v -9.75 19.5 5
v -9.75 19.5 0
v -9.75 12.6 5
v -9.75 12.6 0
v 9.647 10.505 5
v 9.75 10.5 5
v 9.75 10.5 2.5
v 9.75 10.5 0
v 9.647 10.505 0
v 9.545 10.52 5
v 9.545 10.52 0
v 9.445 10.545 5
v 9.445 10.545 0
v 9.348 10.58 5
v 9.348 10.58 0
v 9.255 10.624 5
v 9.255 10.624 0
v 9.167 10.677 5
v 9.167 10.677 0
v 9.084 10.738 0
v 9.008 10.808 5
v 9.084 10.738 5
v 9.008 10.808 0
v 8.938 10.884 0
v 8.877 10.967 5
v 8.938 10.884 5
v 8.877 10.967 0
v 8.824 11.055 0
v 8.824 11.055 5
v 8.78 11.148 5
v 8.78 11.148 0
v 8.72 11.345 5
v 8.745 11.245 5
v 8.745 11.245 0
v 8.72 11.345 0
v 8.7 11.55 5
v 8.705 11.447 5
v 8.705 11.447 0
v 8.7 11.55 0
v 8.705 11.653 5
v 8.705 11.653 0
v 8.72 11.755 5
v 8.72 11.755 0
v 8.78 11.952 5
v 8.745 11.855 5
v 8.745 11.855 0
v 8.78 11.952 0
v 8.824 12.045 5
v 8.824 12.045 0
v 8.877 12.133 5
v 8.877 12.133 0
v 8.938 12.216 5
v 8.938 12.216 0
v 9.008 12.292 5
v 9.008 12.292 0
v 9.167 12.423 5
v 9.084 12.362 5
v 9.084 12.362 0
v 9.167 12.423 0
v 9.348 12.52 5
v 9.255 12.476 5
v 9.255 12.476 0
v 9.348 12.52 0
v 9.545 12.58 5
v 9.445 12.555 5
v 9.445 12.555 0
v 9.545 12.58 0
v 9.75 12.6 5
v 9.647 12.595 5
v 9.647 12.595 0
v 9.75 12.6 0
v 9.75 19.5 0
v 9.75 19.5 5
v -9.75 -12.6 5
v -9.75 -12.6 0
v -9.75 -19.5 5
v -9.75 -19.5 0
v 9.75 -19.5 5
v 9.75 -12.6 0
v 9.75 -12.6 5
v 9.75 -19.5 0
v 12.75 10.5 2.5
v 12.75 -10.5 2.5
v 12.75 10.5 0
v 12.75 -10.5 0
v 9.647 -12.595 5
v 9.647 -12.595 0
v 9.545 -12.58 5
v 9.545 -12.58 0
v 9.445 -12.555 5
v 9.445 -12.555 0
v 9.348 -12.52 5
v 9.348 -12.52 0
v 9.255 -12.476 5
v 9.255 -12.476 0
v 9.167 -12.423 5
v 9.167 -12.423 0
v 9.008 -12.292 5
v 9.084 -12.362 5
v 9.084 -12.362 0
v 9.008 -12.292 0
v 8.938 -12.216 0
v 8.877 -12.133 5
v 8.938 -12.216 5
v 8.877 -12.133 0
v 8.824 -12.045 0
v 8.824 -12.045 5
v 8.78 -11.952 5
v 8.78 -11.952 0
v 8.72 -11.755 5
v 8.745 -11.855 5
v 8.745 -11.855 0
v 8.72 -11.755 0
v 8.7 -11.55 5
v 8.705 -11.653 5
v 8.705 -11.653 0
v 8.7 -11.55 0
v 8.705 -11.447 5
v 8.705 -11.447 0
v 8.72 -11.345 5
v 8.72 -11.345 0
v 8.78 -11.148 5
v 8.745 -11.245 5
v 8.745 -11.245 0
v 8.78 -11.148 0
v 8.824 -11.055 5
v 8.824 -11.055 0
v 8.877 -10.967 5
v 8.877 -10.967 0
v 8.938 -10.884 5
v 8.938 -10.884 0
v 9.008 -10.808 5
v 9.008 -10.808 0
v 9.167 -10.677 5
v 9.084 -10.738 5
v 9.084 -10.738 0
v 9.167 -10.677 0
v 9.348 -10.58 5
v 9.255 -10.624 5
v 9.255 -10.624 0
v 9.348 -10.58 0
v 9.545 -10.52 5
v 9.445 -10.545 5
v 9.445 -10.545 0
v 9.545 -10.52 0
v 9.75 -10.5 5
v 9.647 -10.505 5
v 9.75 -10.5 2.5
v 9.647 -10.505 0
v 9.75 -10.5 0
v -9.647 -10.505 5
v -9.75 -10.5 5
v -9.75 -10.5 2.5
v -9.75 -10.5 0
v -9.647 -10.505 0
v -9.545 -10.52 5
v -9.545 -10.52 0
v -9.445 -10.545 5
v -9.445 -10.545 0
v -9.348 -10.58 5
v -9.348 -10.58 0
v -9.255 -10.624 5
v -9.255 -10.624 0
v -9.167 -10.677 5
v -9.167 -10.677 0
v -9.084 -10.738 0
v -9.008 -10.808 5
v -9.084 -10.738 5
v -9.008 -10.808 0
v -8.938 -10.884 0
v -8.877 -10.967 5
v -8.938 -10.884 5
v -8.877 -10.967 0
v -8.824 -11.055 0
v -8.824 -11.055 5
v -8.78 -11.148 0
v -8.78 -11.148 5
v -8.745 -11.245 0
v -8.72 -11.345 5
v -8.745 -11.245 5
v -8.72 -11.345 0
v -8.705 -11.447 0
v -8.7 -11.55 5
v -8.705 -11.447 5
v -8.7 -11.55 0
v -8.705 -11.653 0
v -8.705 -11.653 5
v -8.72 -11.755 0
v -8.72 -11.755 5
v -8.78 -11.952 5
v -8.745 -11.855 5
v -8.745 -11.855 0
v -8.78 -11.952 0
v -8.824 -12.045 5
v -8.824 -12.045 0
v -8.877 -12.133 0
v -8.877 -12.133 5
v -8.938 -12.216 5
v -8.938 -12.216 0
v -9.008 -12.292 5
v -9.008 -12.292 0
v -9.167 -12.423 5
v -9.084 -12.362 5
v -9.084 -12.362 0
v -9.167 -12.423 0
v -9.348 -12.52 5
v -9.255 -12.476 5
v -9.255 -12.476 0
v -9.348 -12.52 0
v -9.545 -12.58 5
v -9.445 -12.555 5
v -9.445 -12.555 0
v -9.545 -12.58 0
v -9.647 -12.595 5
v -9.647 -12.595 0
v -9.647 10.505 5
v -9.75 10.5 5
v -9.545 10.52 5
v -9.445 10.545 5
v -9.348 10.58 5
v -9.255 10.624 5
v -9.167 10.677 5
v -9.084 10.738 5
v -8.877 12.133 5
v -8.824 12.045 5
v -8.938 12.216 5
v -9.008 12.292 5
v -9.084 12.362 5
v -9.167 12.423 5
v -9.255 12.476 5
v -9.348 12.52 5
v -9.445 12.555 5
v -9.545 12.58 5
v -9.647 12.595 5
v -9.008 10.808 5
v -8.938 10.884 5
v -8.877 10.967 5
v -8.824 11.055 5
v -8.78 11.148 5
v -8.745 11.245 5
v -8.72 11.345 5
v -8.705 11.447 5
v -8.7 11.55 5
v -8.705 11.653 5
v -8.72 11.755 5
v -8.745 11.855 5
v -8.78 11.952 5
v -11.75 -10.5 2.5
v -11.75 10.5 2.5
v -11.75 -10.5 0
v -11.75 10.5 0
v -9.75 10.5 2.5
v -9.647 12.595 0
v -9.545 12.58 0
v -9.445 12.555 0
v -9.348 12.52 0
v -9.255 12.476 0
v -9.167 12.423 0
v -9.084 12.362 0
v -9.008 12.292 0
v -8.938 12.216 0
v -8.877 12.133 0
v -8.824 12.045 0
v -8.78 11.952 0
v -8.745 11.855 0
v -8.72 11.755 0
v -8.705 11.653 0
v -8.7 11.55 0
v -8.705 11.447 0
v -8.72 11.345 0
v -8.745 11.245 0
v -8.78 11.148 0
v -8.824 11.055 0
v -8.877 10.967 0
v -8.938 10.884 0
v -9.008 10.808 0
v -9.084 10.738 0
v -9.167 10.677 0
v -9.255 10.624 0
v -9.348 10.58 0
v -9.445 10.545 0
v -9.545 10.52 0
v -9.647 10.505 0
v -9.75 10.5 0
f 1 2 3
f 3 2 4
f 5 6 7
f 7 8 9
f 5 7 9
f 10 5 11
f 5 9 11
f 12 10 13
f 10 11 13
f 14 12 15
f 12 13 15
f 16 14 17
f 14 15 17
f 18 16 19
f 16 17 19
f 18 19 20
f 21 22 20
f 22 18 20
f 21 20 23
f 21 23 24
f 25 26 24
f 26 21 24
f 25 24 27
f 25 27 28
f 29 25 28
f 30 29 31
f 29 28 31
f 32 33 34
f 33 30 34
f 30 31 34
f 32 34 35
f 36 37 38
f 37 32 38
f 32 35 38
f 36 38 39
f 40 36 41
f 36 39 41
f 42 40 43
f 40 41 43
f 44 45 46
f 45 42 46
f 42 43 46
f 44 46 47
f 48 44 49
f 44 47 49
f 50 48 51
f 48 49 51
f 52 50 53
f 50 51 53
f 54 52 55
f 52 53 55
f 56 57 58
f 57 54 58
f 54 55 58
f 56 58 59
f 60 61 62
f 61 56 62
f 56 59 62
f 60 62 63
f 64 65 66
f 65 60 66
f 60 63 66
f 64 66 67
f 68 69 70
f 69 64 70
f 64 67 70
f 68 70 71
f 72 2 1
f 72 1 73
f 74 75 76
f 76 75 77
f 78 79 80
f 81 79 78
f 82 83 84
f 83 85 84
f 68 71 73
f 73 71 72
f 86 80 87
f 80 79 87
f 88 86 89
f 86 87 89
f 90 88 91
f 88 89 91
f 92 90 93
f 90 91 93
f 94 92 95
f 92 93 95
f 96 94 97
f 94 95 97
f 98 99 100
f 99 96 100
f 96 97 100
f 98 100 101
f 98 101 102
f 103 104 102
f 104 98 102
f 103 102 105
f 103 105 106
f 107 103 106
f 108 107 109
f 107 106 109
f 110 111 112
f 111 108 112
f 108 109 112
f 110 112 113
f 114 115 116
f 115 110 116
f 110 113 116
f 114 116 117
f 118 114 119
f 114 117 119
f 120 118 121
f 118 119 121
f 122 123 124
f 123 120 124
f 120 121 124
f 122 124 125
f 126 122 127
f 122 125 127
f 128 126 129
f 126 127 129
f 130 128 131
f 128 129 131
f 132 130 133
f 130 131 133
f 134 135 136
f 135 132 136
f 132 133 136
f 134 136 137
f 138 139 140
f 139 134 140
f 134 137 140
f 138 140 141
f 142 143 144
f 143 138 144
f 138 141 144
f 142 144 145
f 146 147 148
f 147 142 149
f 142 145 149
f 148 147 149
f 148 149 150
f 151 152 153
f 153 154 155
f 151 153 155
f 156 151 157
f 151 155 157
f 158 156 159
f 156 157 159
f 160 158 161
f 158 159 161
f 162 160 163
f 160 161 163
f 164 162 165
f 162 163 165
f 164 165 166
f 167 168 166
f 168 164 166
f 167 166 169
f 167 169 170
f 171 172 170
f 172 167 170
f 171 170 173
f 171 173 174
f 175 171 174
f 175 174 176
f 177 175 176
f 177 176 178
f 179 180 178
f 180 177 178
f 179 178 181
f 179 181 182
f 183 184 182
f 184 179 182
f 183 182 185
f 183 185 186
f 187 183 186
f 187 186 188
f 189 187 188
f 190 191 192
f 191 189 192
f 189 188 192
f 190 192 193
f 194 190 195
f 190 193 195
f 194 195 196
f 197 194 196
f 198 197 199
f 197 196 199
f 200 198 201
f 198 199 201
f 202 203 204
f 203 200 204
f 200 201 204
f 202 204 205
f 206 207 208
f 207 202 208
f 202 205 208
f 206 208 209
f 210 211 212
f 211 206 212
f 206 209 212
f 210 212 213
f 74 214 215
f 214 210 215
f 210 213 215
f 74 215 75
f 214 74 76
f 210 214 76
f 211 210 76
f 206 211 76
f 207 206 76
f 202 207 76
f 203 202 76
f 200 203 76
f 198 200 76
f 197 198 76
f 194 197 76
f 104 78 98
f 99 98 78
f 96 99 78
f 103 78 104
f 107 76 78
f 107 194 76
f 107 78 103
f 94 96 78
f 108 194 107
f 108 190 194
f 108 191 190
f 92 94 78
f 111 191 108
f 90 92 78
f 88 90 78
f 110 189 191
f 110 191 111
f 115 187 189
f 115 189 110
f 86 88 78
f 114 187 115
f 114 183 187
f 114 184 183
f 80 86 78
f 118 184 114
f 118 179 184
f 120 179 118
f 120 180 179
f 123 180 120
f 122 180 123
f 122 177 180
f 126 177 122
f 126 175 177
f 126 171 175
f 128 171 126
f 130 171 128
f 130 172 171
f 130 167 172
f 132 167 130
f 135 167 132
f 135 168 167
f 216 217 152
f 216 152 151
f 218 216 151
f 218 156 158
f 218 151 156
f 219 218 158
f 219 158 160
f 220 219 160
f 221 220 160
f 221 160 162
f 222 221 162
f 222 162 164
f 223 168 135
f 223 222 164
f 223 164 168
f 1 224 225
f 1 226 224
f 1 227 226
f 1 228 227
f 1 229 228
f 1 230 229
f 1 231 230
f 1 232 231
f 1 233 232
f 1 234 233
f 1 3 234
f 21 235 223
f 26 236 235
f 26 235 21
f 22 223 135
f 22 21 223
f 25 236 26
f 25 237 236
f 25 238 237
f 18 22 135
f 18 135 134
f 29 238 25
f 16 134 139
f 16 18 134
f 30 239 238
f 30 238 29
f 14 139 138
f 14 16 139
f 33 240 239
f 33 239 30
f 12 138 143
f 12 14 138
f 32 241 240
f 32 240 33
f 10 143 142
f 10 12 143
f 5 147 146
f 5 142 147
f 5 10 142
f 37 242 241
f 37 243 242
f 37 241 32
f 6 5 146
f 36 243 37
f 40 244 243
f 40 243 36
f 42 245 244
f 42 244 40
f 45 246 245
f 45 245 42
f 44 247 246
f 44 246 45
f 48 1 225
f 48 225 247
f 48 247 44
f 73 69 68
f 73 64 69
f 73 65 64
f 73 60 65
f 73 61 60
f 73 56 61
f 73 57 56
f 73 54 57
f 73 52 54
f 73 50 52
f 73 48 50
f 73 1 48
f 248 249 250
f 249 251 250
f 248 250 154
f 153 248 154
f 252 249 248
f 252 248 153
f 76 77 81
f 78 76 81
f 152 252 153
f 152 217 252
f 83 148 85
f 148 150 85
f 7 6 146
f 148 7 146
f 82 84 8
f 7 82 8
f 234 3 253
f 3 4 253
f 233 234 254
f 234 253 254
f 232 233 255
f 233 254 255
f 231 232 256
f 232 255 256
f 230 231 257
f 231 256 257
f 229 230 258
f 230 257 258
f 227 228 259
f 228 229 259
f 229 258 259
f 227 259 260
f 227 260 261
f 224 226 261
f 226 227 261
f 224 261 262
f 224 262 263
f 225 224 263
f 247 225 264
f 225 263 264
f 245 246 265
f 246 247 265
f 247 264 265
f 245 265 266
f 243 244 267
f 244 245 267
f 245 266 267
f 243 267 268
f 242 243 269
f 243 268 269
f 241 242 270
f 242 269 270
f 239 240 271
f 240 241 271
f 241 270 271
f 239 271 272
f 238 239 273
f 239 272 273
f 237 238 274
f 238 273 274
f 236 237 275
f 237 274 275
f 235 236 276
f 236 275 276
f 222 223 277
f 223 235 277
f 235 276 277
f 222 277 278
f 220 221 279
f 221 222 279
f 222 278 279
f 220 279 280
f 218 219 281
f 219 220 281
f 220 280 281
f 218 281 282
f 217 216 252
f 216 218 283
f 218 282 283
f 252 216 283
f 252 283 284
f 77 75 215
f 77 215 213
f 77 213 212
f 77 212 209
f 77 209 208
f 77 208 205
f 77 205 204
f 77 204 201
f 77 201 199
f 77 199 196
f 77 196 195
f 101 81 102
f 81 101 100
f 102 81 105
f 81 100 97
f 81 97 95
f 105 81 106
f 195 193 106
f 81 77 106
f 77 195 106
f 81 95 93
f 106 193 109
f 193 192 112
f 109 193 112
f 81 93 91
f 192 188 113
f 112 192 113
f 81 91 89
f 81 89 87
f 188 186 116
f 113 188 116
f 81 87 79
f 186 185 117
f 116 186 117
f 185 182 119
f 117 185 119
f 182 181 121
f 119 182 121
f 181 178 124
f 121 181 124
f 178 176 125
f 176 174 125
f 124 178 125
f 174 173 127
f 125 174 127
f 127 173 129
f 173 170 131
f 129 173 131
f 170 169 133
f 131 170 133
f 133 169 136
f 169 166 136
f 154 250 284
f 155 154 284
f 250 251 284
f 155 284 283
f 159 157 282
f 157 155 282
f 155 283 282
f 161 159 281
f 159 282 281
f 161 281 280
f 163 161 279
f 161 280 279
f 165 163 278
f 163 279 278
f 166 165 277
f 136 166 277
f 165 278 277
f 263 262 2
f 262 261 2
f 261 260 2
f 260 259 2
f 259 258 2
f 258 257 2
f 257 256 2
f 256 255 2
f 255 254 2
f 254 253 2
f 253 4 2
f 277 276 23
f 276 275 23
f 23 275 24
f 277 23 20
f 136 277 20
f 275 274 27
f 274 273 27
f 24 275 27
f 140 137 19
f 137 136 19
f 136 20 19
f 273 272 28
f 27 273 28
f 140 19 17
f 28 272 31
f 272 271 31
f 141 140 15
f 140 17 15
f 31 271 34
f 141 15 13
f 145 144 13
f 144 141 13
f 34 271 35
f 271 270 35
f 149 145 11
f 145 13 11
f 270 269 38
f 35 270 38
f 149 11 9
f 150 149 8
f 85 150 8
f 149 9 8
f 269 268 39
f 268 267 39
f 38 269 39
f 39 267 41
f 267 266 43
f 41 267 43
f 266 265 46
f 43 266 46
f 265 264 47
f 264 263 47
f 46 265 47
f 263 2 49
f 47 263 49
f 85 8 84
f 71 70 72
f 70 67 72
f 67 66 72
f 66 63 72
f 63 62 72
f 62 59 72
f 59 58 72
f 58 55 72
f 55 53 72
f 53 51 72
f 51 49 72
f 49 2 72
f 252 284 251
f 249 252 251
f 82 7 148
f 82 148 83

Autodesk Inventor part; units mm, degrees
ref_plane "YZ Plane" through (0, 0, 0) normal (1, 0, 0) x (0, 1, 0)
ref_plane "XZ Plane" through (0, 0, 0) normal (0, 1, 0) x (-1, 0, 0)
ref_plane "XY Plane" through (0, 0, 0) normal (0, 0, 1) x (1, 0, 0)
sketch "スケッチ1" plane through (0, 0, 0) normal (0, 0, 1) x (1, 0, 0)
  line L0 (-9.75, -19.5) -> (9.75, -19.5) construction
  line L1 (9.75, -19.5) -> (9.75, 19.5) construction
  line L2 (9.75, 19.5) -> (-9.75, 19.5) construction
  line L3 (-9.75, 19.5) -> (-9.75, -19.5) construction
  line L4 (-9.75, -19.5) -> (9.75, 19.5) construction
  line L5 (9.75, -19.5) -> (-9.75, 19.5) construction
  line L6 (-9.75, 10.5) -> (-9.75, 19.5) construction
  line L7 (-9.75, 19.5) -> (9.75, 19.5)
  line L8 (9.75, 19.5) -> (9.75, 10.5) construction
  line L9 (-9.75, 10.5) -> (-11.75, 10.5)
  line L10 (-11.75, 10.5) -> (-11.75, -10.5)
  line L11 (-11.75, -10.5) -> (-9.75, -10.5)
  line L12 (-9.75, -10.5) -> (-9.75, -19.5) construction
  line L13 (-9.75, -19.5) -> (9.75, -19.5)
  line L14 (9.75, -19.5) -> (9.75, -10.5) construction
  line L15 (9.75, -10.5) -> (12.75, -10.5)
  line L16 (12.75, -10.5) -> (12.75, 10.5)
  line L17 (12.75, 10.5) -> (9.75, 10.5)
  line L18 (0, 0) -> (12.75, 0) construction
  circle A0 centre (-9.75, 11.55) radius 1.05 construction
  circle A1 centre (-9.75, -11.55) radius 1.05 construction
  circle A2 centre (9.75, 11.55) radius 1.05 construction
  circle A3 centre (9.75, -11.55) radius 1.05 construction
  line L19 (-9.75, 19.5) -> (-9.75, 12.6)
  arc A4 (-9.75, 10.5) -> (-9.75, 12.6) centre (-9.75, 11.55) ccw
  arc A5 (-9.75, -12.6) -> (-9.75, -10.5) centre (-9.75, -11.55) ccw
  line L20 (-9.75, -12.6) -> (-9.75, -19.5)
  line L21 (9.75, 12.6) -> (9.75, 19.5)
  arc A6 (9.75, 12.6) -> (9.75, 10.5) centre (9.75, 11.55) ccw
  line L22 (9.75, -12.6) -> (9.75, -19.5)
  arc A7 (9.75, -10.5) -> (9.75, -12.6) centre (9.75, -11.55) ccw
  dimension "d21" = 2
  dimension "d23" = 3
  dimension "d30" = 19.5
  dimension "d48" = 9
  dimension "d49" = 39
  dimension "d50" = 2.1
extrude "押し出し1" add sketch "スケッチ1" along normal blind 5
sketch "スケッチ3" plane through (0, 0, 5) normal (0, 0, 1) x (1, 0, 0)
  line L0 (9.75, 12.6) -> (9.75, 19.5) projected
  line L1 (-9.75, 19.5) -> (-9.75, 12.6) projected
  line L2 (-14.3307, 15.6684) -> (-9.75, 15.6684)
  line L3 (-9.75, 15.6684) -> (-9.75, -16.7148)
  line L4 (-9.75, -16.7148) -> (-14.3307, -16.7148)
  line L5 (-14.3307, -16.7148) -> (-14.3307, 15.6684)
  line L6 (15.2214, 11.55) -> (9.75, 11.55)
  line L7 (9.75, 11.55) -> (9.75, -15.9078)
  line L8 (9.75, -15.9078) -> (15.2214, -15.9078)
  line L9 (15.2214, -15.9078) -> (15.2214, 11.55)
  point P0 (0, 0)
extrude "押し出し2" cut sketch "スケッチ3" against normal blind 2.5
equation "\"d48\" = d26 + d35"
equation "\"d49\" = d38"
equation "\"d26\" = 5"
equation "\"d35\" = 4"
equation "\"d38\" = 39"
properties part number "胴体_メインフレーム_1_12" material "アセタール樹脂、黒"
